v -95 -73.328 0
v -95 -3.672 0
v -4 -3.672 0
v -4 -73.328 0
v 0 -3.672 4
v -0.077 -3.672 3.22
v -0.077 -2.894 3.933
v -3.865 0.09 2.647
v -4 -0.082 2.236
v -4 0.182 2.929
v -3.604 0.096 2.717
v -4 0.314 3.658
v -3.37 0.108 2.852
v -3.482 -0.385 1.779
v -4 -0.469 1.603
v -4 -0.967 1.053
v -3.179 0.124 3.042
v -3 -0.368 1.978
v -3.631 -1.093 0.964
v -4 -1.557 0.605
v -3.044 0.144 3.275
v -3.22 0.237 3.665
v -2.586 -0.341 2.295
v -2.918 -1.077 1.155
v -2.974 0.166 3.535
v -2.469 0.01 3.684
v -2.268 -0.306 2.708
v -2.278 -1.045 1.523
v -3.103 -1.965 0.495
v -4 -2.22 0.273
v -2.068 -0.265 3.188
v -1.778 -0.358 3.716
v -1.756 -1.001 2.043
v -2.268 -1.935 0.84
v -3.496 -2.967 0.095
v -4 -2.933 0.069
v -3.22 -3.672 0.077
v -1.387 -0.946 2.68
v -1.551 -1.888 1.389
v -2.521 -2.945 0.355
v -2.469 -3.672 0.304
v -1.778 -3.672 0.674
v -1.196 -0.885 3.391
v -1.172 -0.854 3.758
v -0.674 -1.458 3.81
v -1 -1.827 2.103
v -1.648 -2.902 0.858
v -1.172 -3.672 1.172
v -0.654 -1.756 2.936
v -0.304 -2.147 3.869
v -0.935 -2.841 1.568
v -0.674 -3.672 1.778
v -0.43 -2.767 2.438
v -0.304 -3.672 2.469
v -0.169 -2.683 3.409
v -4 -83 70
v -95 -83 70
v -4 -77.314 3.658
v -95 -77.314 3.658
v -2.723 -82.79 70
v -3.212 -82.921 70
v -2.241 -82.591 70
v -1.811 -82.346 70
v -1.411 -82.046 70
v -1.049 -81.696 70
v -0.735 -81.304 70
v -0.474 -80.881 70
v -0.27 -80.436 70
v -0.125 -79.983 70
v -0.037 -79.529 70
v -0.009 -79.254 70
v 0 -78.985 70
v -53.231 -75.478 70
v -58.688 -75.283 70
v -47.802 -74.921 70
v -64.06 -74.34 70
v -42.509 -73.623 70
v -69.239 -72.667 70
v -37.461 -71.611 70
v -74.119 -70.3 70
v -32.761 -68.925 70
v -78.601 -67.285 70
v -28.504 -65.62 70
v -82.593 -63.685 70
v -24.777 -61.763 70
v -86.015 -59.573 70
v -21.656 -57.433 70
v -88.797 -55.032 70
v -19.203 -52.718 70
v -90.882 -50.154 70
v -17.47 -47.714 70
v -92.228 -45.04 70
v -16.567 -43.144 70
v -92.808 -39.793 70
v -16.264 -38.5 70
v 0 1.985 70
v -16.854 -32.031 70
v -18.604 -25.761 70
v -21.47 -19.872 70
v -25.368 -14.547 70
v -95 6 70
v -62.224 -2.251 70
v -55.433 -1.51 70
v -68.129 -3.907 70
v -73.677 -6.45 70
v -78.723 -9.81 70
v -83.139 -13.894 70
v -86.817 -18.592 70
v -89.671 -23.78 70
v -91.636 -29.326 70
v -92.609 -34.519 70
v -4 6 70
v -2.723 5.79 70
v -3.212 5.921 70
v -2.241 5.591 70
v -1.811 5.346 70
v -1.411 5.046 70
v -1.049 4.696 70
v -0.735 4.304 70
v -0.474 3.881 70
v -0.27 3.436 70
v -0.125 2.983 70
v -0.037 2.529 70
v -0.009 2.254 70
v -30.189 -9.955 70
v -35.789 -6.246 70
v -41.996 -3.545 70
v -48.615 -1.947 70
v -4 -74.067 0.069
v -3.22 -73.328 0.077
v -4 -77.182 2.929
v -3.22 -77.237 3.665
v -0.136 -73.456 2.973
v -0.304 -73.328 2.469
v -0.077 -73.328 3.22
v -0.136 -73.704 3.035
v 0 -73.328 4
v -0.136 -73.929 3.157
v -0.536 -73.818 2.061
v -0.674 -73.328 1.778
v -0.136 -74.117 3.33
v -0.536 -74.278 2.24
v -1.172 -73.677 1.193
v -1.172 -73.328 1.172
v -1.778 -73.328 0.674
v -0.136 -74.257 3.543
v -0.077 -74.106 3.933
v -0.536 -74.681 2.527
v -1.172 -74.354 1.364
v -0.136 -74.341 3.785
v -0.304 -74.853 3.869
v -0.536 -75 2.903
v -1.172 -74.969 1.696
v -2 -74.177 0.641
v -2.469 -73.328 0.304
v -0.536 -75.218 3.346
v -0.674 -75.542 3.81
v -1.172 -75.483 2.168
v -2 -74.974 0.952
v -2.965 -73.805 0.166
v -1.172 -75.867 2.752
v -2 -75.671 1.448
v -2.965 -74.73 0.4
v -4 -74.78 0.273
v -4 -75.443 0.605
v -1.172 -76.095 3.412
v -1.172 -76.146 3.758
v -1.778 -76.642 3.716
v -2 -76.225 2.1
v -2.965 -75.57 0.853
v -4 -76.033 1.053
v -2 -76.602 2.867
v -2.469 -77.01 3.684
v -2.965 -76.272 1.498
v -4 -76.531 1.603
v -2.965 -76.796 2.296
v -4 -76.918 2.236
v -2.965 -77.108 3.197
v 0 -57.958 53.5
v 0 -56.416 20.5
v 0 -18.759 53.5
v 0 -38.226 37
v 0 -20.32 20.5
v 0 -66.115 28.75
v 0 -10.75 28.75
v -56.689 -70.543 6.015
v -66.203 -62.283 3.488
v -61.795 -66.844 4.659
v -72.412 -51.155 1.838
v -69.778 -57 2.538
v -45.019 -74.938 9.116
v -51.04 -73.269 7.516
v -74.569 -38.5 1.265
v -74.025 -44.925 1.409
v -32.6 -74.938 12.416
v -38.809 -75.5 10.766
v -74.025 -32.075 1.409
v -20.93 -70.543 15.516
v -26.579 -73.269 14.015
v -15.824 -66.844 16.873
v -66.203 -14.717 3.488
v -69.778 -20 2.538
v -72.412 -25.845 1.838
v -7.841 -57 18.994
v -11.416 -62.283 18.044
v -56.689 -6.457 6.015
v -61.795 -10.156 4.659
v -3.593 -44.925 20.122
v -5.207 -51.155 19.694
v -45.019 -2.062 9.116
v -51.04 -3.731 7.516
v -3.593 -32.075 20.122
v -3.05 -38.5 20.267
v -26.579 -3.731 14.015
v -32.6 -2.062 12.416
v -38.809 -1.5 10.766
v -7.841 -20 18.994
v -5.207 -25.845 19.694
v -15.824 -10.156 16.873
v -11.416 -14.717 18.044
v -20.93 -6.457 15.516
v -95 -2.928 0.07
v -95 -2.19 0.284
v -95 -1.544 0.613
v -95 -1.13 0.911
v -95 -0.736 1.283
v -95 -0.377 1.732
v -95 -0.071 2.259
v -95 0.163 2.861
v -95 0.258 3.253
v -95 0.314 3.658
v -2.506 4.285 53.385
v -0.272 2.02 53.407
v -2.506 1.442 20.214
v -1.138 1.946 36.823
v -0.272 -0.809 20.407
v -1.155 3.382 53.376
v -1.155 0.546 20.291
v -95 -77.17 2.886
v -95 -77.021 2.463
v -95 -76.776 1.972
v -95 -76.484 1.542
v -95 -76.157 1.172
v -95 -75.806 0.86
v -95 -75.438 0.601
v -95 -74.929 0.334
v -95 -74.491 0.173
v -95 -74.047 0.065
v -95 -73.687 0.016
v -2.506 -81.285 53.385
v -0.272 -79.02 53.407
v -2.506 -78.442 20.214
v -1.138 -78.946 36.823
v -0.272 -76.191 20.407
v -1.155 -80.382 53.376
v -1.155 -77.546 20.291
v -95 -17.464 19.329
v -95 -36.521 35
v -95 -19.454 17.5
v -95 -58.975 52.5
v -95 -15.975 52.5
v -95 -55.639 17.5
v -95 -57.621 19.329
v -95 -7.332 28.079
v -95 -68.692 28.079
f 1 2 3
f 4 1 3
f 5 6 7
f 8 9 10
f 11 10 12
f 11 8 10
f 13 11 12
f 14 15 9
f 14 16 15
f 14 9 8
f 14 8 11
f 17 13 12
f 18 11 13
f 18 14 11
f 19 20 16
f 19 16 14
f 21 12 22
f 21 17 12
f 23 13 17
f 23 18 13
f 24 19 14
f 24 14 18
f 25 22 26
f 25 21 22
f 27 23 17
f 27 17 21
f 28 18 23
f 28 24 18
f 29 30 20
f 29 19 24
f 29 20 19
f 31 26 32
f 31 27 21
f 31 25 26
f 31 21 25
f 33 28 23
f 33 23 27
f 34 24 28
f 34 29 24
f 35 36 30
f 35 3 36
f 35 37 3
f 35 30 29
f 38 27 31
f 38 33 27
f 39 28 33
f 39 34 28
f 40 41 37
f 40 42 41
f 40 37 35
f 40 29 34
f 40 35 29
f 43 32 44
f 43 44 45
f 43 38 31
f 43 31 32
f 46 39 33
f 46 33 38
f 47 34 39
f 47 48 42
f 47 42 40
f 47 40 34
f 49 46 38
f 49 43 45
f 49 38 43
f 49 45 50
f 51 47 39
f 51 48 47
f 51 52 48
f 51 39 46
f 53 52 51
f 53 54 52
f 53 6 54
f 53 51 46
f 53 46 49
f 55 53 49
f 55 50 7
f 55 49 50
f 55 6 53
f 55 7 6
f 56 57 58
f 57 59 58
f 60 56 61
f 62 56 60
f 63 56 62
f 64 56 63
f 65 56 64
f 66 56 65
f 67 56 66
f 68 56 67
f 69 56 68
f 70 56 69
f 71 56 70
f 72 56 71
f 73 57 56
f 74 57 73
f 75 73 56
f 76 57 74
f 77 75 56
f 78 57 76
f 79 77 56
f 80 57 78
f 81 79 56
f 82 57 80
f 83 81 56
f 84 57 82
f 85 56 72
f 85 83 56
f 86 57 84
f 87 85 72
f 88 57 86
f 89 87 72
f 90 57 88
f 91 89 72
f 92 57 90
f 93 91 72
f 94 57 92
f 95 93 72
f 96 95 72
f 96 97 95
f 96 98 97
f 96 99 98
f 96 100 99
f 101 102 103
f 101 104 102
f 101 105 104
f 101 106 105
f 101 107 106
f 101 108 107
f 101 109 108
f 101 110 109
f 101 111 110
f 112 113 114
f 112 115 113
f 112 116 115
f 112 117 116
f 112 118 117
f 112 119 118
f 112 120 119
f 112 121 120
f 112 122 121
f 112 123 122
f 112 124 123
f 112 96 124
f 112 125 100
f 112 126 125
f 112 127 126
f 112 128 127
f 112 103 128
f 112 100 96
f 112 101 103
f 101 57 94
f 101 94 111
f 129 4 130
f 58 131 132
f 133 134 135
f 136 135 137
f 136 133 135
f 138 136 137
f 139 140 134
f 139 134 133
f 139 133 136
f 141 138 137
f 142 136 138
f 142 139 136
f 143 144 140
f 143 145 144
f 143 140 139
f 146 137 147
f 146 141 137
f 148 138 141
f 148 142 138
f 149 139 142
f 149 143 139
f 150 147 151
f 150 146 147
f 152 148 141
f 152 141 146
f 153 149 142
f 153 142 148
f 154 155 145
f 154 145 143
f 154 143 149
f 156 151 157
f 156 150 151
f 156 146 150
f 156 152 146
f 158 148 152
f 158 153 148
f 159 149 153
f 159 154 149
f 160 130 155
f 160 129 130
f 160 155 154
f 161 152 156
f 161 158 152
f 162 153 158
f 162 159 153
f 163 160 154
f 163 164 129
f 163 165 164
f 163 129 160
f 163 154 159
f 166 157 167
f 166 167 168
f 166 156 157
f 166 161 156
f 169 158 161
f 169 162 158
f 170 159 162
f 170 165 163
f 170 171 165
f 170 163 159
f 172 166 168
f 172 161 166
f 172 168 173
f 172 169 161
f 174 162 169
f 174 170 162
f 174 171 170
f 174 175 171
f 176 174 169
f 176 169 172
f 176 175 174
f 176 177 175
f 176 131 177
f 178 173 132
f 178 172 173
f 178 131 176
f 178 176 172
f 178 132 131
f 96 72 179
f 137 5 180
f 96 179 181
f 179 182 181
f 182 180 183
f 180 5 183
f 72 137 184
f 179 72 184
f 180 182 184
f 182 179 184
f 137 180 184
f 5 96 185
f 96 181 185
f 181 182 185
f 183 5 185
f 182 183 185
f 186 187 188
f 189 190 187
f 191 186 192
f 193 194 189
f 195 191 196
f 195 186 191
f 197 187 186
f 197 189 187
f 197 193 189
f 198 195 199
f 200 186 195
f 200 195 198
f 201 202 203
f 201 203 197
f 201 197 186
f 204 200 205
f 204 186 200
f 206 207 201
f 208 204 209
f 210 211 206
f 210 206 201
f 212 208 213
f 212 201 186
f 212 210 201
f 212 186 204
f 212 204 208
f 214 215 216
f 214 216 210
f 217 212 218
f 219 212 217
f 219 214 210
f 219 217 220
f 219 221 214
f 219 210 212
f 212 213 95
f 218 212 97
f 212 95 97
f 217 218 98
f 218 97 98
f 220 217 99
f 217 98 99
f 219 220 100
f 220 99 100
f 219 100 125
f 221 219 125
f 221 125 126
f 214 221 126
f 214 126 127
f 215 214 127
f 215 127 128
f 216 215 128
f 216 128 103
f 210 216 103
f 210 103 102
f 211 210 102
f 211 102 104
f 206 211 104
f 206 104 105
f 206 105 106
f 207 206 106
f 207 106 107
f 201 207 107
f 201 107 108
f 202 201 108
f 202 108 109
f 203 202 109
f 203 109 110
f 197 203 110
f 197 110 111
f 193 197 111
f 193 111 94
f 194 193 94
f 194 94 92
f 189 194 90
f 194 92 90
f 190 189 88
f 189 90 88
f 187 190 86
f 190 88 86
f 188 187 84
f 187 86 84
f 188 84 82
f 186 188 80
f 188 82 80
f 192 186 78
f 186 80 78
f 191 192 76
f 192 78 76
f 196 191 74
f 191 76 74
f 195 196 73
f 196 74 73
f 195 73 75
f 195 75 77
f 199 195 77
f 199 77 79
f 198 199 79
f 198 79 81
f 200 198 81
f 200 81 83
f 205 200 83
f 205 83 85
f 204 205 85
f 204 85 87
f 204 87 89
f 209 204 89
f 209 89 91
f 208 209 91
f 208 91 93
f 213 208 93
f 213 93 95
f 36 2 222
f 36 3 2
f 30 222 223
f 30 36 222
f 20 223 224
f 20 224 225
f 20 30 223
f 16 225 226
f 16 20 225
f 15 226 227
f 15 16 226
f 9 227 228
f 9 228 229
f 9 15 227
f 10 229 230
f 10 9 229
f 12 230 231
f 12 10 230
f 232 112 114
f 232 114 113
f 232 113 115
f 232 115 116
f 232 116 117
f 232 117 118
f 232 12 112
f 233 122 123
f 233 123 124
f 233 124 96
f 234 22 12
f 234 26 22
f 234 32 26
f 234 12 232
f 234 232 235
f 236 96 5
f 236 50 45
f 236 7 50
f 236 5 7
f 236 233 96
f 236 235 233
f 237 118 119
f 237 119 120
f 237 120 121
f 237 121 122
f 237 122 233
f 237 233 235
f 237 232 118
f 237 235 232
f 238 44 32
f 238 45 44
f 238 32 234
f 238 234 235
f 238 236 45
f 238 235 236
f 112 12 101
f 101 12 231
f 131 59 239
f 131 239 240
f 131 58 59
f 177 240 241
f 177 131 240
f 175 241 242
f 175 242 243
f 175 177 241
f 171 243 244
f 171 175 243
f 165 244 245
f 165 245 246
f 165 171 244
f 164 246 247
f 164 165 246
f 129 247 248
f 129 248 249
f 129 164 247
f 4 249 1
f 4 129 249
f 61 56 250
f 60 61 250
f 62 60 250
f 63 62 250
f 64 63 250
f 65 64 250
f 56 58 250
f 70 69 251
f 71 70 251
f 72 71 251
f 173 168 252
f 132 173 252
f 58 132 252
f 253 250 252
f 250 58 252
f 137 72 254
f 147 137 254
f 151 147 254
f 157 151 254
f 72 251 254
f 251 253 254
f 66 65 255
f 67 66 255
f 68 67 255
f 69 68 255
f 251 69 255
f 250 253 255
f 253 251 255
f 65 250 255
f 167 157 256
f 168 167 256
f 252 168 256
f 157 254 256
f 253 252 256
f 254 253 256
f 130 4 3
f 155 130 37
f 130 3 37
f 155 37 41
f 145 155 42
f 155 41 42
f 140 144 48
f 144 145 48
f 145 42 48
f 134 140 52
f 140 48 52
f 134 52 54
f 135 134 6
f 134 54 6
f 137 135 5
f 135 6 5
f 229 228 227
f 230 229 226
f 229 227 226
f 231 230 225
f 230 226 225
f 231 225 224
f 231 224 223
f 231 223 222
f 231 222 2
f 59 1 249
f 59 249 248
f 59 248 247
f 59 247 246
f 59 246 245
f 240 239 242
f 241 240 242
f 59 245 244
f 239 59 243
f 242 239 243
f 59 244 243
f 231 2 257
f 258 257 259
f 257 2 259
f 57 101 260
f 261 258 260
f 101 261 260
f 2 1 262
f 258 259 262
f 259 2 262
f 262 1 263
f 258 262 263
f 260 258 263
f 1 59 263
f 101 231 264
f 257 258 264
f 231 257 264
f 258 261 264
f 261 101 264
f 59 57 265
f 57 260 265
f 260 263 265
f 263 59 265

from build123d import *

# Parameters (mm, degrees)
F2_W     = 95
F2_H     = 89
F0_W     = 95
F0_H     = 77
F7_R     = 37
F8_DEPTH = 85.8
F9_R     = 4


# Not quite as in the source:
# - a feature names something its author has since deleted; it is built from what else it names


with BuildPart() as f3:
    # F2 (on offset) → F3 section 0
    with BuildSketch(Plane.XY.offset(70)):
        with Locations((-47.5, -38.5)):
            Rectangle(F2_W, F2_H)
    # F0 (on Top) → F3 section 1
    with BuildSketch(Plane.XY):
        with Locations((-47.5, -38.5)):
            Rectangle(F0_W, F0_H)
    loft()

    # F7 (on face) → F8 (cut)
    with BuildSketch(Plane(origin=(-27.2627936506, 0, 102.6103478024), x_dir=(0.966468953, 0, 0.2567834941), z_dir=(-0.2567834941, 0, 0.966468953))):
        with Locations((-34.7436182201, -38.5)):
            Circle(F7_R)
    extrude(amount=-F8_DEPTH, mode=Mode.SUBTRACT)

    # F9
    f9_edges = [f3.edges().sort_by_distance(p)[0] for p in [
        (-47.5, -77, 0),
        (0, -38.5, 0),
        (-47.5, 0, 0),
        (0, -80, 35),
        (0, 3, 35),
    ]]
    fillet(f9_edges, radius=F9_R)


solid = f3.part
